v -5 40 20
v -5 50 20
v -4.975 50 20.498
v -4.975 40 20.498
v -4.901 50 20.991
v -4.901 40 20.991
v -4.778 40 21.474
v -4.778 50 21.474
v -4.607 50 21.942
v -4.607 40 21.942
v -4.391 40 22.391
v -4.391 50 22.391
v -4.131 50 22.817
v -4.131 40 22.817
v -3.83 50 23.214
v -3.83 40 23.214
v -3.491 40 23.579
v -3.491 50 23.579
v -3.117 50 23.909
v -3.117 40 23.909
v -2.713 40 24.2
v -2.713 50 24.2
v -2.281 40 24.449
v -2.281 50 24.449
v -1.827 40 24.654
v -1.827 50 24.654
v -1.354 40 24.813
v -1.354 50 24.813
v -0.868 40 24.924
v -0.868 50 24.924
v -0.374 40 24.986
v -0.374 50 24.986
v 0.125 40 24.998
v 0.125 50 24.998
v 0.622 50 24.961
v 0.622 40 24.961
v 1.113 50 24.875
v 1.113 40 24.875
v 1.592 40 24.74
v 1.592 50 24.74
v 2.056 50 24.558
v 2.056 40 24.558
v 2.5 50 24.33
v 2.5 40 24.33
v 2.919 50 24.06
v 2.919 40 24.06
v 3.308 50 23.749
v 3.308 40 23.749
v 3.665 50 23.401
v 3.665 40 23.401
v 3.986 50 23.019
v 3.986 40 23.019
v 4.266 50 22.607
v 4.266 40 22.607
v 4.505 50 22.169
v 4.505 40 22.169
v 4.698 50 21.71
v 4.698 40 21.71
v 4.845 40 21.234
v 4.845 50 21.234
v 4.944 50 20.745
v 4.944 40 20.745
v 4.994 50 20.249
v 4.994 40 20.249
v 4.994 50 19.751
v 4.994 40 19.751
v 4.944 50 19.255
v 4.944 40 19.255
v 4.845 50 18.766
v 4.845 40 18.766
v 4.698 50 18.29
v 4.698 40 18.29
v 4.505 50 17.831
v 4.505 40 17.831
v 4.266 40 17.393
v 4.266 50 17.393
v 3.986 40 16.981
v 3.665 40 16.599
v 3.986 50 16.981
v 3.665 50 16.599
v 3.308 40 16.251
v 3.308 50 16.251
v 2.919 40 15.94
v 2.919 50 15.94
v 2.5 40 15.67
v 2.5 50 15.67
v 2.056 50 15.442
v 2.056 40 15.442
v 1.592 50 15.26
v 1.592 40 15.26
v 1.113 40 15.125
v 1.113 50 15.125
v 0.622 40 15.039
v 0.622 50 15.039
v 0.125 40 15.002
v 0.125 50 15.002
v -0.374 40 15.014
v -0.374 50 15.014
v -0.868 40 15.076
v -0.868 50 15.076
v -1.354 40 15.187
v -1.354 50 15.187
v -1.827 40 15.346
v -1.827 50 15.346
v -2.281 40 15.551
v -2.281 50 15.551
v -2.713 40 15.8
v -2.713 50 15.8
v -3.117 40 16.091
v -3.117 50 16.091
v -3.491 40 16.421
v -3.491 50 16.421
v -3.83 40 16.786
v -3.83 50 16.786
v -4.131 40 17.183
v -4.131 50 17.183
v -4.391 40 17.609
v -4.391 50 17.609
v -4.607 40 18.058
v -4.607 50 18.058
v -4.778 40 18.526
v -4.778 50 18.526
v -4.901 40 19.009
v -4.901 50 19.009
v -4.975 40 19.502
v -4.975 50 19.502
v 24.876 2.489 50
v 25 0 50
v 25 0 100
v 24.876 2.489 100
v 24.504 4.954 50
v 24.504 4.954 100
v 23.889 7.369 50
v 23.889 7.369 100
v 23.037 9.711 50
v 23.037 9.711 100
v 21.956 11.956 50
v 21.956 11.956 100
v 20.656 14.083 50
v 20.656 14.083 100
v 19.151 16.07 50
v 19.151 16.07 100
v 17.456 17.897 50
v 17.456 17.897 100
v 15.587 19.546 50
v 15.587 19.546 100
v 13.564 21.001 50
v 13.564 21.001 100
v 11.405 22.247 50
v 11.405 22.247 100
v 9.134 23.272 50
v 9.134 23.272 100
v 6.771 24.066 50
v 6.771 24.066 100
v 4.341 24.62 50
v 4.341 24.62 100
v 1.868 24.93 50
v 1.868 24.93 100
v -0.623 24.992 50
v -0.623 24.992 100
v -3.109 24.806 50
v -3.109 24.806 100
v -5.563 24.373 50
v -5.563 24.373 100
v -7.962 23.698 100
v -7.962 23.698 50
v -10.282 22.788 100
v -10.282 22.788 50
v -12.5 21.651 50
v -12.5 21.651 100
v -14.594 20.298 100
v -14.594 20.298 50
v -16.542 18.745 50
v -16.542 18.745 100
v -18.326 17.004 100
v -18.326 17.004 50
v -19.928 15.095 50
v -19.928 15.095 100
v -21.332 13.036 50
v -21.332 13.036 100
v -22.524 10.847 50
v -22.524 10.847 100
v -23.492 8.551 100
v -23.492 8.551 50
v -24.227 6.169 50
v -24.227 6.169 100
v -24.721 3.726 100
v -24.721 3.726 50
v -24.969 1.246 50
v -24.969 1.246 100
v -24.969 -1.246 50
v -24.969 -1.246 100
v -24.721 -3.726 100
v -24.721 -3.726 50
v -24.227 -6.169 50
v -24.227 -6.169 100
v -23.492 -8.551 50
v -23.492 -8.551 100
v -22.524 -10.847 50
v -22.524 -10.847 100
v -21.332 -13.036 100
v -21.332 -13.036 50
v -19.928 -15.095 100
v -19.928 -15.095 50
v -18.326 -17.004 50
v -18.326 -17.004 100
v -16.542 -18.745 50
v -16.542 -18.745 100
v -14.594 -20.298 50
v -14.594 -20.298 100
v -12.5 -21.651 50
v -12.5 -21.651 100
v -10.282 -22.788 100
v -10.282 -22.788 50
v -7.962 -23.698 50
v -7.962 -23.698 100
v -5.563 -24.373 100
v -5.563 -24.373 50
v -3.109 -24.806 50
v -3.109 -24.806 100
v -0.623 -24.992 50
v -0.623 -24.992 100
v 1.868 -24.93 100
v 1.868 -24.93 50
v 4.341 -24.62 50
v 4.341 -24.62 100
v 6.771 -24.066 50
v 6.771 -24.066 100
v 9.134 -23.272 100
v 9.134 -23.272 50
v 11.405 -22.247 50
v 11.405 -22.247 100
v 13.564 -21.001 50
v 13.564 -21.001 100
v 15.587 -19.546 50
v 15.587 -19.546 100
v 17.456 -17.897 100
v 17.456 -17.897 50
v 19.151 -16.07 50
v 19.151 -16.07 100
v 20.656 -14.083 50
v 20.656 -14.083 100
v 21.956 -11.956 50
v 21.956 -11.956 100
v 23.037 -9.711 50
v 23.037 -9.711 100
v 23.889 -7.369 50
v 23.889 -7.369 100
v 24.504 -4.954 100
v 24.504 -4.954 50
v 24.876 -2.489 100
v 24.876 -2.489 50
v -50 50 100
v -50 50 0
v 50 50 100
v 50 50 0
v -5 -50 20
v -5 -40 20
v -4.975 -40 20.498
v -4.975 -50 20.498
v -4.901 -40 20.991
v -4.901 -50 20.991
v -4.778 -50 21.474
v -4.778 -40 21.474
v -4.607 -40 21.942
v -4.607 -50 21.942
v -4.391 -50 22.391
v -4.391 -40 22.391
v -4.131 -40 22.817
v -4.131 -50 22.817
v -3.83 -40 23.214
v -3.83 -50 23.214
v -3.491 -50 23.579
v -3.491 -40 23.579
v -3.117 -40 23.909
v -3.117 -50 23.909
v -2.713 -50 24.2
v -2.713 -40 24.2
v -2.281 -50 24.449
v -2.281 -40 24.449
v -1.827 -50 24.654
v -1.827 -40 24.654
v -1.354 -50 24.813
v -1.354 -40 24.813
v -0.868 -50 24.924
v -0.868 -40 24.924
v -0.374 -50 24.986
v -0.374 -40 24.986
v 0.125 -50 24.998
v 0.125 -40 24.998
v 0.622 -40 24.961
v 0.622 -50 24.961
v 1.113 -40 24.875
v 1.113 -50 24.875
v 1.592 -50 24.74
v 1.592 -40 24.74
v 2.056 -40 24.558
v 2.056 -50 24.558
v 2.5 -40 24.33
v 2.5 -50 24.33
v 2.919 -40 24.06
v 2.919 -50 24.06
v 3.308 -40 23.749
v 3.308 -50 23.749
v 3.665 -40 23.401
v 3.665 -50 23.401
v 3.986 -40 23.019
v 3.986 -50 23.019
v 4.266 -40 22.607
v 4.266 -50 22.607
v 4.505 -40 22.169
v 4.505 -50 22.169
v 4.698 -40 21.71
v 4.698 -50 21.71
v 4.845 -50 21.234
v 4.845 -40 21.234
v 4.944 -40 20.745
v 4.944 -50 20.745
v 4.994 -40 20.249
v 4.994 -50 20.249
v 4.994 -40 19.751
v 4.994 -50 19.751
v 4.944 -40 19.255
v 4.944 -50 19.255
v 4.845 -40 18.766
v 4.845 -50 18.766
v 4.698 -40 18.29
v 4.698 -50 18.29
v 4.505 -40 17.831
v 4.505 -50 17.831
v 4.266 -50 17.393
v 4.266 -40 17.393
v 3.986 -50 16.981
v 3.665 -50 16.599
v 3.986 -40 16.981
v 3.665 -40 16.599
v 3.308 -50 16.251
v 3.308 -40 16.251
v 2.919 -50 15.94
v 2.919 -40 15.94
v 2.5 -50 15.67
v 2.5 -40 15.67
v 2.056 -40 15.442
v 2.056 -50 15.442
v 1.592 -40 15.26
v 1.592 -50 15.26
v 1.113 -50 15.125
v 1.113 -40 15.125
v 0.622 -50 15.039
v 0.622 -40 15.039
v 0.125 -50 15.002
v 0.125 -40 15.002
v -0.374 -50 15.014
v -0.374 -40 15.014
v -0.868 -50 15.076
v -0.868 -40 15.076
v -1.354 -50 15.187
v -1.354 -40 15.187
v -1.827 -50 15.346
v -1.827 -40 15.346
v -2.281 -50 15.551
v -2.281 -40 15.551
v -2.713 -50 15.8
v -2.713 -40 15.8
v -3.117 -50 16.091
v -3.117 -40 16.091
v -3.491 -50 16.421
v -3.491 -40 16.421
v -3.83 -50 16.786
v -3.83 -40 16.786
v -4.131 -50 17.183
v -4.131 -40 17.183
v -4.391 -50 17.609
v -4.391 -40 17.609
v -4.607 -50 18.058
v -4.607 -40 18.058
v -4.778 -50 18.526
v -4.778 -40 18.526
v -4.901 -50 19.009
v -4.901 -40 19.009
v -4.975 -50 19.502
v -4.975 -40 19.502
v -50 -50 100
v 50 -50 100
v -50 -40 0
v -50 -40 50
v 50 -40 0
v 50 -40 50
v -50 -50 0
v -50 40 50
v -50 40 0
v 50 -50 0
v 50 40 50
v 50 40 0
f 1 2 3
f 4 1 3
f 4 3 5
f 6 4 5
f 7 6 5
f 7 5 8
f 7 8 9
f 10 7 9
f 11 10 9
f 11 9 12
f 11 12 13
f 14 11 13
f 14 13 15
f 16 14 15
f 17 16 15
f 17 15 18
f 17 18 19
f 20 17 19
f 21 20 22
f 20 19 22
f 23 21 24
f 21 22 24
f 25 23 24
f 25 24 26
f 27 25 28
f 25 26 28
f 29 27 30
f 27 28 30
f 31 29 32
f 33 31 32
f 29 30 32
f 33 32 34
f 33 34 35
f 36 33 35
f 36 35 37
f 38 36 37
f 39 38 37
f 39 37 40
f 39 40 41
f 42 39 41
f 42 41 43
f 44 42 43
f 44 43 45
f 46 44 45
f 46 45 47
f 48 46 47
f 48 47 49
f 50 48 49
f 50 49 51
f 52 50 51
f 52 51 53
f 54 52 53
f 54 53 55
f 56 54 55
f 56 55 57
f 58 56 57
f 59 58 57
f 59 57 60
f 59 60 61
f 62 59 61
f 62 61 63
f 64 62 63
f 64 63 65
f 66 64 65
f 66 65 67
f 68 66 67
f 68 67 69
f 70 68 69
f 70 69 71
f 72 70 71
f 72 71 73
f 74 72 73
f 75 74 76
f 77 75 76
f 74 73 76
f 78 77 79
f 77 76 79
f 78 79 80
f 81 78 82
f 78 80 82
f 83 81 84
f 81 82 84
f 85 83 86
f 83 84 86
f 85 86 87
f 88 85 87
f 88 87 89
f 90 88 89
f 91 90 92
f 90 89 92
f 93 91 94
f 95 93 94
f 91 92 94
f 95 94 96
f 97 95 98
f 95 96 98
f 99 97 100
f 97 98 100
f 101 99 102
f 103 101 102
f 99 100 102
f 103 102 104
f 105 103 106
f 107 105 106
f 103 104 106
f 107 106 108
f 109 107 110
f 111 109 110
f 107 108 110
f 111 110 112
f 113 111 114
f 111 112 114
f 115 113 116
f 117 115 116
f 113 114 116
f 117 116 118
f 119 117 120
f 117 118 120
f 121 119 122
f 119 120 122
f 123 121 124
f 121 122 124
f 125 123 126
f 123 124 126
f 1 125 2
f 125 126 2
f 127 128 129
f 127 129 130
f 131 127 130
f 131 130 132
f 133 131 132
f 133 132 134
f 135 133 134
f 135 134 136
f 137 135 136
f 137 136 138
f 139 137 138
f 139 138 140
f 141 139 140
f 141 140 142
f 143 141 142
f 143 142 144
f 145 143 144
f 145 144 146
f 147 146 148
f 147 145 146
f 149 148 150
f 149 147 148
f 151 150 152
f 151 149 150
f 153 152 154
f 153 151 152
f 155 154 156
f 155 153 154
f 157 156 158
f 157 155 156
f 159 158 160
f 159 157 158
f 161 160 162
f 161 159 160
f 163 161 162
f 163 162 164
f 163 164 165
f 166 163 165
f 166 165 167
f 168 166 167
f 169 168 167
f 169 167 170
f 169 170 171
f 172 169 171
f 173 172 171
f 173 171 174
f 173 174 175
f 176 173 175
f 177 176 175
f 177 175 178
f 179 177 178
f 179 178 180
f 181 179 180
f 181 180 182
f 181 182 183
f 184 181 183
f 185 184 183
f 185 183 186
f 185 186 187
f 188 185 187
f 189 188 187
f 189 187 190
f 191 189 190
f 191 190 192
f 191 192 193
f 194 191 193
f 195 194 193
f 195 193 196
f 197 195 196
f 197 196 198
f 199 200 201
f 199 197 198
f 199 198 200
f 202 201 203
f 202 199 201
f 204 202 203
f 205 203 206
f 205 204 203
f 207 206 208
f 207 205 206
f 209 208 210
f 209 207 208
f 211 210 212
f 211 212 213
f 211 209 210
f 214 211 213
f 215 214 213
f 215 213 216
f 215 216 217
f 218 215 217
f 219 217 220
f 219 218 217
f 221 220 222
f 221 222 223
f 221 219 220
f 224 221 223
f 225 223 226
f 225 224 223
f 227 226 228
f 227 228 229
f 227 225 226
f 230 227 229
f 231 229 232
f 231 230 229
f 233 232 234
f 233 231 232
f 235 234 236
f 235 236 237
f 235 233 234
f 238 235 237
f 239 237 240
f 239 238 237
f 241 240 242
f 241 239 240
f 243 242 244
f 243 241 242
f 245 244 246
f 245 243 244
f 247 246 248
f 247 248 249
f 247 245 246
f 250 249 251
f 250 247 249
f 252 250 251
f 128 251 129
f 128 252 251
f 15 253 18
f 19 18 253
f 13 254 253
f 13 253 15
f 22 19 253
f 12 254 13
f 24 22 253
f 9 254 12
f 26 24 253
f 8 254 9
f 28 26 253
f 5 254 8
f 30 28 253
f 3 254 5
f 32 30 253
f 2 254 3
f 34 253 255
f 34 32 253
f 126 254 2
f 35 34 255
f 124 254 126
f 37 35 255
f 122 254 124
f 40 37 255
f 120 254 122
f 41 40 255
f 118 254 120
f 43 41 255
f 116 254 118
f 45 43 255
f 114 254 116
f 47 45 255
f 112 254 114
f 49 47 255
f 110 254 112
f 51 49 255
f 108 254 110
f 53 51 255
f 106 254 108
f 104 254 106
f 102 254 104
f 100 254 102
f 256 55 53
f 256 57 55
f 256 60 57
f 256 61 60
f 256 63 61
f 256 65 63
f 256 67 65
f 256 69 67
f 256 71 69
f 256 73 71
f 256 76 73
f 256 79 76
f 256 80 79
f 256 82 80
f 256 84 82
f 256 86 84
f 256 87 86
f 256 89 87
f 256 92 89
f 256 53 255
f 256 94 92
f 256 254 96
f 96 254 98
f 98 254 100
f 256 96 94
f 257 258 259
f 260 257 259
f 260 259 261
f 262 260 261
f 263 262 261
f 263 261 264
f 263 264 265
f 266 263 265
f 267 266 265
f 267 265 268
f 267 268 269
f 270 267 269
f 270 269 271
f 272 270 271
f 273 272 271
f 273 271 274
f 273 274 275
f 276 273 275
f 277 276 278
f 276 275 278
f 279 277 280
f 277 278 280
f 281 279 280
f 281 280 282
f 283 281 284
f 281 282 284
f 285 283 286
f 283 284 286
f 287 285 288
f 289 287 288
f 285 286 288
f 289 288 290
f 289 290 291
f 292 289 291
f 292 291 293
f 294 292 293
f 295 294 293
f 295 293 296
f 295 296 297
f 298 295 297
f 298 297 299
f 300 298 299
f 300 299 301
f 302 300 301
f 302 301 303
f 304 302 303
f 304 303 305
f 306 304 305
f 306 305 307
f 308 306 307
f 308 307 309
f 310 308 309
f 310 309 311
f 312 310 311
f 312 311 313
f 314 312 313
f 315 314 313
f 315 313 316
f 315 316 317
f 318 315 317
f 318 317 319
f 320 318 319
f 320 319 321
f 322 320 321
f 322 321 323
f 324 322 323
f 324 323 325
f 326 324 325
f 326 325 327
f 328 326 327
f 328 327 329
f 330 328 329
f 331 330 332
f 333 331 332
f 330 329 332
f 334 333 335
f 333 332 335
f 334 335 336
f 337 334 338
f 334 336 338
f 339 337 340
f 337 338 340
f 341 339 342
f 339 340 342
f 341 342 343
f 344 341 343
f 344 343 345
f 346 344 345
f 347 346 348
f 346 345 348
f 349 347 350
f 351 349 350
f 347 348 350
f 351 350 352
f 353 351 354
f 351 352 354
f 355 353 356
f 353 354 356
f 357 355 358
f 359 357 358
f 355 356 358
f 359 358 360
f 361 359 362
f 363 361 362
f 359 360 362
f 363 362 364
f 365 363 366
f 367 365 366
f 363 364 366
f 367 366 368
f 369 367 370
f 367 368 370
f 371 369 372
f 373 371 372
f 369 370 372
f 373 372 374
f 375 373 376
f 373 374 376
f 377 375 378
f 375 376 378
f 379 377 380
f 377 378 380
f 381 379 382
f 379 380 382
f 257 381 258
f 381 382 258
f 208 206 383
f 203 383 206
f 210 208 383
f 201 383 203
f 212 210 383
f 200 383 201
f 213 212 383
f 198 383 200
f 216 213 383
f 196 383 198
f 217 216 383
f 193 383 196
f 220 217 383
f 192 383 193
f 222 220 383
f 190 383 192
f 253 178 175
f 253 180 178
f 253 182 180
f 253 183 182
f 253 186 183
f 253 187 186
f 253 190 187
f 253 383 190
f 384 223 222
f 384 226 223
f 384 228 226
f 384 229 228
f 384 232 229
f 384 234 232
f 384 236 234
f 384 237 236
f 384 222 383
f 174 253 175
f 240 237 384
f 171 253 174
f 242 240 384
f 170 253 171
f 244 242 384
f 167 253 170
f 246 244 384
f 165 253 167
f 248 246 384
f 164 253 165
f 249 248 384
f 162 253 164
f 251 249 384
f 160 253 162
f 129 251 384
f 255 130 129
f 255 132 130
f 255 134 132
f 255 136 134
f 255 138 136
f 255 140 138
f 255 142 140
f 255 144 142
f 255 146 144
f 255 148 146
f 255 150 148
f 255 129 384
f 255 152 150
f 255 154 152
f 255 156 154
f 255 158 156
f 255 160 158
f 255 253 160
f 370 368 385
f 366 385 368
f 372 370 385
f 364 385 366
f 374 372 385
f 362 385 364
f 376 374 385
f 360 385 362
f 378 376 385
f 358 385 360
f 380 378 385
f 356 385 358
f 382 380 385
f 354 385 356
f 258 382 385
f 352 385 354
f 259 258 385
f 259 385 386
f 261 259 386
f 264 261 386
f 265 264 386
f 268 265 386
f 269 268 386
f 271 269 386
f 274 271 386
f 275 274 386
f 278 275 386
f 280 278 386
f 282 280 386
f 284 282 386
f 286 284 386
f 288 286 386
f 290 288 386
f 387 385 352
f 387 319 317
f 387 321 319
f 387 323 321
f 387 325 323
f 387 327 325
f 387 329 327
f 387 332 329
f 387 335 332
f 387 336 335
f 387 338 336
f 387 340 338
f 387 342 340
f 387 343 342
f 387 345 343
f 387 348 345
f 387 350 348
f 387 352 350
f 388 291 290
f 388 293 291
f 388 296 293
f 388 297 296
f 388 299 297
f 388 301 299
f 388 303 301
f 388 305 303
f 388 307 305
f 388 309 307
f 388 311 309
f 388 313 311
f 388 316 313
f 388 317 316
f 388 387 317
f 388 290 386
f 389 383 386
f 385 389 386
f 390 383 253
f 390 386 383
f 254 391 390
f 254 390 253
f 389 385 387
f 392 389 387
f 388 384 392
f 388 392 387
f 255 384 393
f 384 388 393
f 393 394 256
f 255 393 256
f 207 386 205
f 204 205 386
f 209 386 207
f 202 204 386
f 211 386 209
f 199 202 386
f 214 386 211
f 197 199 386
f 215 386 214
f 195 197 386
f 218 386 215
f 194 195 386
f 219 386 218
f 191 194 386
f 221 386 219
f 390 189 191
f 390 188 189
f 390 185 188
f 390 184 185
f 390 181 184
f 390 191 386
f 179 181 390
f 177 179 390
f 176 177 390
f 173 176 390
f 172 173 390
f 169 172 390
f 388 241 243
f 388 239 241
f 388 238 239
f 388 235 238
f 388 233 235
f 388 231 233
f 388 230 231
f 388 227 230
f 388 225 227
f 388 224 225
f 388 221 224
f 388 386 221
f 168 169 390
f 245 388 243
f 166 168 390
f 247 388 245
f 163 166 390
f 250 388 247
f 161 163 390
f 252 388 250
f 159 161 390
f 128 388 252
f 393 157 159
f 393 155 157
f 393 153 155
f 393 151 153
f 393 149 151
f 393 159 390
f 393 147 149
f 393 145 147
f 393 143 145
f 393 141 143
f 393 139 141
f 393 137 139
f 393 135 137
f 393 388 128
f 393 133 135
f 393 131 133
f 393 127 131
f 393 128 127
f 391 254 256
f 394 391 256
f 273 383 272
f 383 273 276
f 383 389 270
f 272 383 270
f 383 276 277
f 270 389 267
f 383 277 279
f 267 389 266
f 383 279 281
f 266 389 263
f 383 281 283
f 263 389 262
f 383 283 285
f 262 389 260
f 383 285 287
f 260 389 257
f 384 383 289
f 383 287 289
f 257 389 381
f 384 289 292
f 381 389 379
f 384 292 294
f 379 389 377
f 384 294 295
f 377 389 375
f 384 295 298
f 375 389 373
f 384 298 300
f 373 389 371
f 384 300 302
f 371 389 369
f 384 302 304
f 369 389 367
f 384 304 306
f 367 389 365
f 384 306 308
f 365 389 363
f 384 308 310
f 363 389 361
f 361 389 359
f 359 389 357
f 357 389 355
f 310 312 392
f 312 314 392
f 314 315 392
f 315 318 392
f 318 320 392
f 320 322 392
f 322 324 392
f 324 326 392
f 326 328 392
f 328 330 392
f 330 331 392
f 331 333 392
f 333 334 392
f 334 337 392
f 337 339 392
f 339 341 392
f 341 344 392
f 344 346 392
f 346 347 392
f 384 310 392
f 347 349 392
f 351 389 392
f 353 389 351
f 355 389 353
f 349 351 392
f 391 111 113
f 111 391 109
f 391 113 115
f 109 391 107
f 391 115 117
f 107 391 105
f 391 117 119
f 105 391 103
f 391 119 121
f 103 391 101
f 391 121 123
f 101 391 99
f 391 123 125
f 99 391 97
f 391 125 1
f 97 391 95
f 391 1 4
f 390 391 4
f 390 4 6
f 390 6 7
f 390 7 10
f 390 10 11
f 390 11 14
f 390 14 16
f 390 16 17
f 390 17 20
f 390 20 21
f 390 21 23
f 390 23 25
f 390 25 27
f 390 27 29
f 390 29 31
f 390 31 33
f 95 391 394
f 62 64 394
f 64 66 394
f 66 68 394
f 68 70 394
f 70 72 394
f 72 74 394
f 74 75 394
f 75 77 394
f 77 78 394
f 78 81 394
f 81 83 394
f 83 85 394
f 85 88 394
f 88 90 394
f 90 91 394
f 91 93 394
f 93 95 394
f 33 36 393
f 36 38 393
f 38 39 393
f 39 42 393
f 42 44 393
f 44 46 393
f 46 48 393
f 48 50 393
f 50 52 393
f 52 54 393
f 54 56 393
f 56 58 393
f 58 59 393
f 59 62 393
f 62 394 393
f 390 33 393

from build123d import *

# Parameters (mm, degrees)
F0_W     = 100
F0_H     = 100
F0_R     = 25
F1_DEPTH = 100
F2_W     = 80
F2_H     = 100
F3_DEPTH = 100
F4_R     = 5
F5_DEPTH = 100


with BuildPart() as f1:
    # F0 (on Top) → F1 (new body)
    with BuildSketch(Plane.XY):
        Rectangle(F0_W, F0_H)
        Circle(F0_R, mode=Mode.SUBTRACT)
    extrude(amount=F1_DEPTH)

    # F2 (on face) → F3 (cut)
    with BuildSketch(Plane.YZ.offset(50)):
        Rectangle(F2_W, F2_H)
    extrude(amount=-F3_DEPTH, mode=Mode.SUBTRACT)

    # F4 (on face) → F5 (cut)
    with BuildSketch(Plane(origin=(0, 50, 0), x_dir=(-1, 0, 0), z_dir=(0, 1, 0))):
        with Locations((0, 20)):
            Circle(F4_R)
    extrude(amount=-F5_DEPTH, mode=Mode.SUBTRACT)


solid = f1.part
